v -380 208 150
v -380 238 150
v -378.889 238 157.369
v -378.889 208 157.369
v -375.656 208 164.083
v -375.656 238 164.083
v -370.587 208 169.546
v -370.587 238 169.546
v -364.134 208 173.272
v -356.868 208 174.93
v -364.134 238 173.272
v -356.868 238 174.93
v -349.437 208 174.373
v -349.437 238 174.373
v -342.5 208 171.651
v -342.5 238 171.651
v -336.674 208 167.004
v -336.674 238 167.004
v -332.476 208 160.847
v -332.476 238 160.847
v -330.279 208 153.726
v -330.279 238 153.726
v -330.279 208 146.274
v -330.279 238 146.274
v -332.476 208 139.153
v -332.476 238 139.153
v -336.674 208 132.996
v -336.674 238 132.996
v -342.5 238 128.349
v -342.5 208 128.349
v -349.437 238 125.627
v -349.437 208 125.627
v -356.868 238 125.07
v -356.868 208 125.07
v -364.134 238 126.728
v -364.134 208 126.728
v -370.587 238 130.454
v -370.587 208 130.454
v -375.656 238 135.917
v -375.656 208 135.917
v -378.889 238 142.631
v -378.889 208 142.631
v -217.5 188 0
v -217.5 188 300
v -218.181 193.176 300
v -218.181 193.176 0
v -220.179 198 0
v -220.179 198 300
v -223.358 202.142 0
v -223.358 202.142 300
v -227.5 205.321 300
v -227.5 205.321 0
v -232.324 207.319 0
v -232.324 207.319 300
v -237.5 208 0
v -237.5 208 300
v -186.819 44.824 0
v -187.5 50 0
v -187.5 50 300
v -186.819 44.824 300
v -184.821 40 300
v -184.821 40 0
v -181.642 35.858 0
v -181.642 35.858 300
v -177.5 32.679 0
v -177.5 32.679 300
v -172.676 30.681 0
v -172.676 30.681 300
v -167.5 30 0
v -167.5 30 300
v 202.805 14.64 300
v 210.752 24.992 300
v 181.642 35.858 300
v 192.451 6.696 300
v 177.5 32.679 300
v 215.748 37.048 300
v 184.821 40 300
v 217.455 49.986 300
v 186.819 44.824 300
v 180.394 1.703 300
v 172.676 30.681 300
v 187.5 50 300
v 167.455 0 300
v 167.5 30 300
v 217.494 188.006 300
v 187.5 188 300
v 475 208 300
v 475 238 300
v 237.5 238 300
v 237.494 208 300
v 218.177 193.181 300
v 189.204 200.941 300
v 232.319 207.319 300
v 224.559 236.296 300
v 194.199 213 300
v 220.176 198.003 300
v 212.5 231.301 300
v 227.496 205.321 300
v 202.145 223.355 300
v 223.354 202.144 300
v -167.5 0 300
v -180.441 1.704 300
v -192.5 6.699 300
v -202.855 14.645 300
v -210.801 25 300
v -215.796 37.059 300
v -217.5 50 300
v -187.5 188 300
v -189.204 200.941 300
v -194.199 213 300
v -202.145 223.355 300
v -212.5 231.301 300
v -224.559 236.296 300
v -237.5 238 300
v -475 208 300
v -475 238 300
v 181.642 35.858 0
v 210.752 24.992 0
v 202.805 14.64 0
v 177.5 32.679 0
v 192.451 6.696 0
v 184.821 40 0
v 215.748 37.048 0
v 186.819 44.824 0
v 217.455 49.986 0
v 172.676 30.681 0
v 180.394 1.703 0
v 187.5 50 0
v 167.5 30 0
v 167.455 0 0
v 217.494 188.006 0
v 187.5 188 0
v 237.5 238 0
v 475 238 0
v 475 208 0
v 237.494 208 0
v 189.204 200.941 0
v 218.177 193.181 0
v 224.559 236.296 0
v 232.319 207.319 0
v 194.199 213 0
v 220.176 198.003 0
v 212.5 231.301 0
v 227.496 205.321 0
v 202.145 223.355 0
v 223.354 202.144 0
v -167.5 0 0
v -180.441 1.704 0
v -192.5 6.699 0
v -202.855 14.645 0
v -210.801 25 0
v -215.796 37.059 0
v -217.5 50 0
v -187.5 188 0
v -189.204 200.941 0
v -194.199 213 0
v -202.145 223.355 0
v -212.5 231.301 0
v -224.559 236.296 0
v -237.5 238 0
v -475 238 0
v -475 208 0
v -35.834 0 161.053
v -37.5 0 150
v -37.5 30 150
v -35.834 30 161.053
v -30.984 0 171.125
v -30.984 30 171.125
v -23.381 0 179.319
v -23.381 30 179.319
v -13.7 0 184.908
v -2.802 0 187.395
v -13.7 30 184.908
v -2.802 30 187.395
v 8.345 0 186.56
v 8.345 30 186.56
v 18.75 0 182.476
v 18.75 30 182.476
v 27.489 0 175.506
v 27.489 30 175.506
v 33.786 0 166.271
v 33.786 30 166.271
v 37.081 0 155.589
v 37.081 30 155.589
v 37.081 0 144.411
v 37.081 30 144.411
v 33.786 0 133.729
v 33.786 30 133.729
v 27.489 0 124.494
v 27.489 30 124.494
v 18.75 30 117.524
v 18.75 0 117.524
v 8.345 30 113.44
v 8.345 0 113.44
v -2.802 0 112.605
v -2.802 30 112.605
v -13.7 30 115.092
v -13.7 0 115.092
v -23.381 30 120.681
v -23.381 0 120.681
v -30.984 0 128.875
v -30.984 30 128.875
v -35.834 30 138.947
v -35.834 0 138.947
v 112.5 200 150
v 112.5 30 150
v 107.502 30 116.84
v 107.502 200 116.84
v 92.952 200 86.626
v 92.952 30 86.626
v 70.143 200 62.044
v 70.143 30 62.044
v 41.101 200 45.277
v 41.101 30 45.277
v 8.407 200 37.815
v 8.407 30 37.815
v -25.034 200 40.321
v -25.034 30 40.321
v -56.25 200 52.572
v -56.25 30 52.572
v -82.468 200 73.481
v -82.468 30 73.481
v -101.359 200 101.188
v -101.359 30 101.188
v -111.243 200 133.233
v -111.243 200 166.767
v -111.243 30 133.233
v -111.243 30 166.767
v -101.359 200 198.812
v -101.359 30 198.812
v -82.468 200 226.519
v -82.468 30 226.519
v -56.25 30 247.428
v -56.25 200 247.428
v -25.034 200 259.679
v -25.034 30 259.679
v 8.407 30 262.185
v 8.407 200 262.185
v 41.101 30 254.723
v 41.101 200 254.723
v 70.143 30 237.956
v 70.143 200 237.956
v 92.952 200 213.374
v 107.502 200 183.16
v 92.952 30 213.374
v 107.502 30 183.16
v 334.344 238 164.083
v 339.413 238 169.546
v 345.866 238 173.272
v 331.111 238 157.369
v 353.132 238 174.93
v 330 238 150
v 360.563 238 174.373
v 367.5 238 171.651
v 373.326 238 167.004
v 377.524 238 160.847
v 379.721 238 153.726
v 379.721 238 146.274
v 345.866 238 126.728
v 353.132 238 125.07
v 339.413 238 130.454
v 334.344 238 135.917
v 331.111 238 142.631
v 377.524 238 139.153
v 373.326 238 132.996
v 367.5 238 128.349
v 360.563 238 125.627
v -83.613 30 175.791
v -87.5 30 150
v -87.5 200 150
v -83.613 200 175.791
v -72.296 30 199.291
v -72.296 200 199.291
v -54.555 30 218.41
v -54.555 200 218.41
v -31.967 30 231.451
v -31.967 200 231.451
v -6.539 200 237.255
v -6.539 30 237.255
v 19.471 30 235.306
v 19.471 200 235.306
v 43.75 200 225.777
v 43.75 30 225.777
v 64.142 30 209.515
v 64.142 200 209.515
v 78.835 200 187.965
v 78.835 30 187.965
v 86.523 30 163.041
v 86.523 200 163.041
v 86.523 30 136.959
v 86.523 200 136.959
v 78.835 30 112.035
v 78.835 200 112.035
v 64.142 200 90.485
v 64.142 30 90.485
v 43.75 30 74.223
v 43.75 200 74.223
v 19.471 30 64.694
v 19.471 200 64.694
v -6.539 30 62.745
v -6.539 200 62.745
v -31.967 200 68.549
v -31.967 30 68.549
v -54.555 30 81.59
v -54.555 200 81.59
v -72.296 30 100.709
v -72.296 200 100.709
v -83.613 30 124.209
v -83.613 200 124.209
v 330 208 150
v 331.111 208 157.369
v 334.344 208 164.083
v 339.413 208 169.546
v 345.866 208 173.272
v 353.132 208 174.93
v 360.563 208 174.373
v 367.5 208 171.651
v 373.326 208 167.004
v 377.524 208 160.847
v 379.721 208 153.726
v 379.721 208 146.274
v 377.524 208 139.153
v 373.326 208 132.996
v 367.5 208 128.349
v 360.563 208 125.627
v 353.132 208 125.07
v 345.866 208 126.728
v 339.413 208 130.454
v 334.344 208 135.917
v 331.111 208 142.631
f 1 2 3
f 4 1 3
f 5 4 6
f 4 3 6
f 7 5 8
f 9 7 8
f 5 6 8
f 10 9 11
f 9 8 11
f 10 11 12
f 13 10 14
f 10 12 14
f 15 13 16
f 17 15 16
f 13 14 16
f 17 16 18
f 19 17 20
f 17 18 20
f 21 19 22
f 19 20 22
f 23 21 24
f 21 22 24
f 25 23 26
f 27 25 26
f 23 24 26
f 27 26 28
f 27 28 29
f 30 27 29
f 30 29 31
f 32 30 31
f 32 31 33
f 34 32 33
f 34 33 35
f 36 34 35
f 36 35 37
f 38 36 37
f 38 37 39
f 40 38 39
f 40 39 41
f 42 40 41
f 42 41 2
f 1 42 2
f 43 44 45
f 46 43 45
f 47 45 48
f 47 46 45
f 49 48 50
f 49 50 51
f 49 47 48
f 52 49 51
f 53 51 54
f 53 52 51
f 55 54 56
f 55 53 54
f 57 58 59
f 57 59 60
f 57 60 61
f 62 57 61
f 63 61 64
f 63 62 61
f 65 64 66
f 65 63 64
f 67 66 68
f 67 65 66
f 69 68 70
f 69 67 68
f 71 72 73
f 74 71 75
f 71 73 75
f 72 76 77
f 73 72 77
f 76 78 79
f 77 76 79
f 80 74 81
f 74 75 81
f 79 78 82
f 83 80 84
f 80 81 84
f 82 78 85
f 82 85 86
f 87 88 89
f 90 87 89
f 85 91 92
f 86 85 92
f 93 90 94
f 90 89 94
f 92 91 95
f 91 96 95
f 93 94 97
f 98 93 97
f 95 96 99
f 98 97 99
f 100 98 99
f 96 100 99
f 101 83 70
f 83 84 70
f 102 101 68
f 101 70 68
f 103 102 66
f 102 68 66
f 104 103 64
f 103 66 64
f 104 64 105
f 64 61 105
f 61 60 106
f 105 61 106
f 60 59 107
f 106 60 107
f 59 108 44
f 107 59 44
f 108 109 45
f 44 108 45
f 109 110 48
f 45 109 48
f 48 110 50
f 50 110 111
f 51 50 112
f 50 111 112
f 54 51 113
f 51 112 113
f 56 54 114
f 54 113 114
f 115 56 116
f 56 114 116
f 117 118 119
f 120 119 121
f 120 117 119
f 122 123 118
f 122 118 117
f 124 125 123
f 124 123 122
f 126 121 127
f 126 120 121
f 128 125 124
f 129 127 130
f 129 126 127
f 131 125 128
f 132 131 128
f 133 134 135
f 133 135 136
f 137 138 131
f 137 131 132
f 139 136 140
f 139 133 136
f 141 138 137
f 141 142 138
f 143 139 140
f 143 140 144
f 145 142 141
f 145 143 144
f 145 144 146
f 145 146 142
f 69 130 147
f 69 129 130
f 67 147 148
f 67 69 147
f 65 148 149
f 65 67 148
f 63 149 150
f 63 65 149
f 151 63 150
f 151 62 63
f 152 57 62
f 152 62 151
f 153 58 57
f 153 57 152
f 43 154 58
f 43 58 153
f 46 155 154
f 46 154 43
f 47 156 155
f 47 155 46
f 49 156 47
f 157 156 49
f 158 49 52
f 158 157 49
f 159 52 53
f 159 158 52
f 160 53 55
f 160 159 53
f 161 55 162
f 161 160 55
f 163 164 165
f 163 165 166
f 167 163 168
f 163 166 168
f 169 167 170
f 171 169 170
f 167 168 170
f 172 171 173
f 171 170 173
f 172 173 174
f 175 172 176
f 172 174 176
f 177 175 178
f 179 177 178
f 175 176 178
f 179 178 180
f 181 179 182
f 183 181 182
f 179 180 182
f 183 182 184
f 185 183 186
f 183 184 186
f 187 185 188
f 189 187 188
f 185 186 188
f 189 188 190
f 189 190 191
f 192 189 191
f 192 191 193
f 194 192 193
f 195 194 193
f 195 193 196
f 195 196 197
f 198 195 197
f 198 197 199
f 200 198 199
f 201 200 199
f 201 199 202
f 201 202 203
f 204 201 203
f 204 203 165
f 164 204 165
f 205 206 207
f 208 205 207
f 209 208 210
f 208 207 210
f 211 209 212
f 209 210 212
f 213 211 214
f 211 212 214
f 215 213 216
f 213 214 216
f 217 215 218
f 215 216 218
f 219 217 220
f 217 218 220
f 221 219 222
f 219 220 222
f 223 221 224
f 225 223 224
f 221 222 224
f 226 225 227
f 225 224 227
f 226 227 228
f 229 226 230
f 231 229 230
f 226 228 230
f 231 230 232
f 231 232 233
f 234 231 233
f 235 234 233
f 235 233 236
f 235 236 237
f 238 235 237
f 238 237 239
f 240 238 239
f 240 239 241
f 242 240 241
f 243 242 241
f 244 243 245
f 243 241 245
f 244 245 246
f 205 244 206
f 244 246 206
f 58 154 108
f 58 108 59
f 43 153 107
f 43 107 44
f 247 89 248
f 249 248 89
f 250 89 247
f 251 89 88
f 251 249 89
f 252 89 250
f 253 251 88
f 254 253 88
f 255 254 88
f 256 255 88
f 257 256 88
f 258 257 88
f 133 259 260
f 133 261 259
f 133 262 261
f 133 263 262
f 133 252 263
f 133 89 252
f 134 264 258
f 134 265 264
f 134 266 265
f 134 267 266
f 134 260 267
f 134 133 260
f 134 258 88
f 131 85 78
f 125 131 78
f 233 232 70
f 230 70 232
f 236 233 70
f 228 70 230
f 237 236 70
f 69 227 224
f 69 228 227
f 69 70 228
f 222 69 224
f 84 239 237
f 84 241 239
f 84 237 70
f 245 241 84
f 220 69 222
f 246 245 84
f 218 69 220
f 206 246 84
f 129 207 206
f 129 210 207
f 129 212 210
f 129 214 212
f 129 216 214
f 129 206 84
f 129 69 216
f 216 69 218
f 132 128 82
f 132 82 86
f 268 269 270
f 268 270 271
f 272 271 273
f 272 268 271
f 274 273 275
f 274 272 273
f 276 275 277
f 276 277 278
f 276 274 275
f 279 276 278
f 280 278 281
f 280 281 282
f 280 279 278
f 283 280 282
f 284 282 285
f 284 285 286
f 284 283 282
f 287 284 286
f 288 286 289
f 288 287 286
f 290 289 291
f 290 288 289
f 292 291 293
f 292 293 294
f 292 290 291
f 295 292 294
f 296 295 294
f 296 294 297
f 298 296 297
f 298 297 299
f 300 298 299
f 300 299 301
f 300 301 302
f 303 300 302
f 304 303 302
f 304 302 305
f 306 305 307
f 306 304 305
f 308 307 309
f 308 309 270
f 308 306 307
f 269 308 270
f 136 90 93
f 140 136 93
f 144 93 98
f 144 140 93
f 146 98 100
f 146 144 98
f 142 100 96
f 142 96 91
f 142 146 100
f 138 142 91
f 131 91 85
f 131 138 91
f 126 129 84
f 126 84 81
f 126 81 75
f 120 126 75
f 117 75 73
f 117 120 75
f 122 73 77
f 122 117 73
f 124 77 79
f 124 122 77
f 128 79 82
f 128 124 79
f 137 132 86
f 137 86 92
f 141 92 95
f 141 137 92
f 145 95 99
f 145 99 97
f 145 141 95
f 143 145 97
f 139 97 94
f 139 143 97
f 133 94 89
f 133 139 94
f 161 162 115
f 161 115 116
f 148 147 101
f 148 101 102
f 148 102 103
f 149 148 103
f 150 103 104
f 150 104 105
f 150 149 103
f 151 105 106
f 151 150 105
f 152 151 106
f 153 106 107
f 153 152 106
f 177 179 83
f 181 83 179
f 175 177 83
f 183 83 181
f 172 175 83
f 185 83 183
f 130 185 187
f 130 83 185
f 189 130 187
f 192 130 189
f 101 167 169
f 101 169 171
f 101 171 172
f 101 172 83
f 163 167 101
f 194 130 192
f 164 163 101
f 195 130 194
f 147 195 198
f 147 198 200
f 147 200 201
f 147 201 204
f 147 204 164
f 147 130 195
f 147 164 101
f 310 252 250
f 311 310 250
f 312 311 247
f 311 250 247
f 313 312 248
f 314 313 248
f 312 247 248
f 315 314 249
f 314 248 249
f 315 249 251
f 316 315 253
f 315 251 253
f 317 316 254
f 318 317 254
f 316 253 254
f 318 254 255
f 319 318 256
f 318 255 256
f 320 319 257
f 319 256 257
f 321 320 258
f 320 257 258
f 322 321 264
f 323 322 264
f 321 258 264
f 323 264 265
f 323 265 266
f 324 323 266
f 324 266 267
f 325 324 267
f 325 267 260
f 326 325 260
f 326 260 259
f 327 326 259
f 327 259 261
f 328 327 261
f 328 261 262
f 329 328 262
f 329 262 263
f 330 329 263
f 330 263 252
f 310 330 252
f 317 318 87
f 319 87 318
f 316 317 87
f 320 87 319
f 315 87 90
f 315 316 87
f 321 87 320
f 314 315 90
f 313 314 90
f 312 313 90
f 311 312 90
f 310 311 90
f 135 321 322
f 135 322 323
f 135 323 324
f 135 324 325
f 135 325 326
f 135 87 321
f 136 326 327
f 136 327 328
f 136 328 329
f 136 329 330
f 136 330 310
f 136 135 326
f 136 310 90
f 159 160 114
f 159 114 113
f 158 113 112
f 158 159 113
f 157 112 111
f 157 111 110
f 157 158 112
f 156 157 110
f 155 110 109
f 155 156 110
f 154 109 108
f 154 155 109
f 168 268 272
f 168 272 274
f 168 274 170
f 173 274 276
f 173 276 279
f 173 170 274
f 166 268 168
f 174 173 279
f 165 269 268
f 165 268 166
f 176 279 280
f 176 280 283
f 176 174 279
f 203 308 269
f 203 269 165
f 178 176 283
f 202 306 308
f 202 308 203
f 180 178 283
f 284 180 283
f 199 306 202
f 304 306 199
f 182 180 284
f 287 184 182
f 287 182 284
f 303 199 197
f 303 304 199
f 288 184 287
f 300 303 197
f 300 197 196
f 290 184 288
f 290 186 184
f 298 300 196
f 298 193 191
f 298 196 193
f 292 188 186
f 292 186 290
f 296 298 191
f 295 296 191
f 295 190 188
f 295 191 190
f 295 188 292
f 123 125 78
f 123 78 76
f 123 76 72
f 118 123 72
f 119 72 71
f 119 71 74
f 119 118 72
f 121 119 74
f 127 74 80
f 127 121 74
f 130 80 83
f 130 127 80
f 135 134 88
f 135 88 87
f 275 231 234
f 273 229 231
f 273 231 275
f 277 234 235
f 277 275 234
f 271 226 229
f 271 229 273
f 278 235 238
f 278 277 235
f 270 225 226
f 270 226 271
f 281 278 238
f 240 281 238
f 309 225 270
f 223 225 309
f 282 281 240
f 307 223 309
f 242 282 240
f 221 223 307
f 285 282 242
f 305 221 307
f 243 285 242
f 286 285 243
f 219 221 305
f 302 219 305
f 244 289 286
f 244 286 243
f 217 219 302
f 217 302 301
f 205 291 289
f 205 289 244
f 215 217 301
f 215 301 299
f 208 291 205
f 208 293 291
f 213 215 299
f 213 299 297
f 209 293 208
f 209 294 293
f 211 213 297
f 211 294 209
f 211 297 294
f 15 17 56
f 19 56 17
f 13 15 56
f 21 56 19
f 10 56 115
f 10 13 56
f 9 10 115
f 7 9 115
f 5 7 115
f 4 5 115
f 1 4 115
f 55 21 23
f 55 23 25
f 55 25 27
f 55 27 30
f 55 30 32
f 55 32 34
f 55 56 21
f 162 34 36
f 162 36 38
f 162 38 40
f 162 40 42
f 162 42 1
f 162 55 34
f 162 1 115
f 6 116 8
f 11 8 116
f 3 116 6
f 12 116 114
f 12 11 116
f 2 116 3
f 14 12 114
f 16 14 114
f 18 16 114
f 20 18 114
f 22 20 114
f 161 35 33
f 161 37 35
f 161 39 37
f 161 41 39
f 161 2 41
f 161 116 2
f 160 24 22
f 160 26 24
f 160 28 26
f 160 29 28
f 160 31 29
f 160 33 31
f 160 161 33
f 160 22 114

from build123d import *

# Parameters (mm, degrees)
BOSS_EXTRUDE1_DEPTH = 300
SKETCH3_R           = 25
CUT_EXTRUDE2_DEPTH  = 239
LPATTERN1_COUNT     = 2
LPATTERN1_PITCH     = 710
SKETCH4_R           = 112.5
SKETCH4_R_2         = 87.5
BOSS_EXTRUDE2_DEPTH = 170
SKETCH5_R           = 37.5
CUT_EXTRUDE3_DEPTH  = 170


with BuildPart() as part:
    # Sketch1 → Boss-Extrude1 (new body)
    with BuildSketch(Plane.XY):
        with BuildLine():
            Line((0, 0), (-167.5, 0))
            ThreePointArc((-167.5, 0), (-202.855339059, 14.644660941), (-217.5, 50))
            Line((-217.5, 50), (-217.5, 188))
            ThreePointArc((-217.5, 188), (-223.357864376, 202.142135624), (-237.5, 208))
            Line((-237.5, 208), (-475, 208))
            Line((-475, 208), (-475, 238))
            Line((-475, 238), (-237.5, 238))
            ThreePointArc((-237.5, 238), (-202.144660941, 223.355339059), (-187.5, 188))
            Line((-187.5, 188), (-187.5, 50))
            ThreePointArc((-187.5, 50), (-181.642135624, 35.857864376), (-167.5, 30))
            Line((-167.5, 30), (0, 30))
            Line((0, 30), (167.5, 30))
            ThreePointArc((167.5, 30), (181.642135624, 35.857864376), (187.5, 50))
            Line((187.5, 50), (187.5, 188))
            ThreePointArc((187.5, 188), (202.144660941, 223.355339059), (237.5, 238))
            Line((237.5, 238), (475, 238))
            Line((475, 238), (475, 208))
            Line((475, 208), (237.494317451, 208))
            ThreePointArc((237.494317451, 208), (223.35419134, 202.144144851), (217.494318258, 188.005683357))
            Line((217.494318258, 188.005683357), (217.455097442, 49.985791608))
            ThreePointArc((217.455097442, 49.985791608), (202.805414738, 14.639637872), (167.455099461, 0))
            Line((167.455099461, 0), (0, 0))
        make_face()
    extrude(amount=BOSS_EXTRUDE1_DEPTH)

    # Sketch3 → Cut-Extrude2 (cut, through all)
    with BuildSketch(Plane(origin=(0, 238, 0), x_dir=(1, 0, 0), z_dir=(0, 1, 0))):
        with Locations(Location((355, -150, 0), (0, 0, 180))):  # turned: the seam where the file's is
            Circle(SKETCH3_R)
    cut_extrude2 = extrude(amount=-CUT_EXTRUDE2_DEPTH, mode=Mode.SUBTRACT)

    # LPattern1: Cut-Extrude2 ×2
    with Locations(*[(-i * LPATTERN1_PITCH, 0, 0) for i in range(1, LPATTERN1_COUNT)]):
        add(cut_extrude2, mode=Mode.SUBTRACT)

    # Sketch4 → Boss-Extrude2 (add)
    with BuildSketch(Plane(origin=(0, 30, 0), x_dir=(1, 0, 0), z_dir=(0, 1, 0))):
        with Locations((0, -150)):
            Circle(SKETCH4_R)
        with Locations(Location((0, -150, 0), (0, 0, 180))):  # turned: the seam where the file's is
            Circle(SKETCH4_R_2, mode=Mode.SUBTRACT)
    extrude(amount=BOSS_EXTRUDE2_DEPTH)

    # Sketch5 → Cut-Extrude3 (cut)
    with BuildSketch(Plane(origin=(0, 30, 0), x_dir=(1, 0, 0), z_dir=(0, 1, 0))):
        with Locations(Location((0, -150, 0), (0, 0, 180))):  # turned: the seam where the file's is
            Circle(SKETCH5_R)
    extrude(amount=-CUT_EXTRUDE3_DEPTH, mode=Mode.SUBTRACT)


solid = part.part
